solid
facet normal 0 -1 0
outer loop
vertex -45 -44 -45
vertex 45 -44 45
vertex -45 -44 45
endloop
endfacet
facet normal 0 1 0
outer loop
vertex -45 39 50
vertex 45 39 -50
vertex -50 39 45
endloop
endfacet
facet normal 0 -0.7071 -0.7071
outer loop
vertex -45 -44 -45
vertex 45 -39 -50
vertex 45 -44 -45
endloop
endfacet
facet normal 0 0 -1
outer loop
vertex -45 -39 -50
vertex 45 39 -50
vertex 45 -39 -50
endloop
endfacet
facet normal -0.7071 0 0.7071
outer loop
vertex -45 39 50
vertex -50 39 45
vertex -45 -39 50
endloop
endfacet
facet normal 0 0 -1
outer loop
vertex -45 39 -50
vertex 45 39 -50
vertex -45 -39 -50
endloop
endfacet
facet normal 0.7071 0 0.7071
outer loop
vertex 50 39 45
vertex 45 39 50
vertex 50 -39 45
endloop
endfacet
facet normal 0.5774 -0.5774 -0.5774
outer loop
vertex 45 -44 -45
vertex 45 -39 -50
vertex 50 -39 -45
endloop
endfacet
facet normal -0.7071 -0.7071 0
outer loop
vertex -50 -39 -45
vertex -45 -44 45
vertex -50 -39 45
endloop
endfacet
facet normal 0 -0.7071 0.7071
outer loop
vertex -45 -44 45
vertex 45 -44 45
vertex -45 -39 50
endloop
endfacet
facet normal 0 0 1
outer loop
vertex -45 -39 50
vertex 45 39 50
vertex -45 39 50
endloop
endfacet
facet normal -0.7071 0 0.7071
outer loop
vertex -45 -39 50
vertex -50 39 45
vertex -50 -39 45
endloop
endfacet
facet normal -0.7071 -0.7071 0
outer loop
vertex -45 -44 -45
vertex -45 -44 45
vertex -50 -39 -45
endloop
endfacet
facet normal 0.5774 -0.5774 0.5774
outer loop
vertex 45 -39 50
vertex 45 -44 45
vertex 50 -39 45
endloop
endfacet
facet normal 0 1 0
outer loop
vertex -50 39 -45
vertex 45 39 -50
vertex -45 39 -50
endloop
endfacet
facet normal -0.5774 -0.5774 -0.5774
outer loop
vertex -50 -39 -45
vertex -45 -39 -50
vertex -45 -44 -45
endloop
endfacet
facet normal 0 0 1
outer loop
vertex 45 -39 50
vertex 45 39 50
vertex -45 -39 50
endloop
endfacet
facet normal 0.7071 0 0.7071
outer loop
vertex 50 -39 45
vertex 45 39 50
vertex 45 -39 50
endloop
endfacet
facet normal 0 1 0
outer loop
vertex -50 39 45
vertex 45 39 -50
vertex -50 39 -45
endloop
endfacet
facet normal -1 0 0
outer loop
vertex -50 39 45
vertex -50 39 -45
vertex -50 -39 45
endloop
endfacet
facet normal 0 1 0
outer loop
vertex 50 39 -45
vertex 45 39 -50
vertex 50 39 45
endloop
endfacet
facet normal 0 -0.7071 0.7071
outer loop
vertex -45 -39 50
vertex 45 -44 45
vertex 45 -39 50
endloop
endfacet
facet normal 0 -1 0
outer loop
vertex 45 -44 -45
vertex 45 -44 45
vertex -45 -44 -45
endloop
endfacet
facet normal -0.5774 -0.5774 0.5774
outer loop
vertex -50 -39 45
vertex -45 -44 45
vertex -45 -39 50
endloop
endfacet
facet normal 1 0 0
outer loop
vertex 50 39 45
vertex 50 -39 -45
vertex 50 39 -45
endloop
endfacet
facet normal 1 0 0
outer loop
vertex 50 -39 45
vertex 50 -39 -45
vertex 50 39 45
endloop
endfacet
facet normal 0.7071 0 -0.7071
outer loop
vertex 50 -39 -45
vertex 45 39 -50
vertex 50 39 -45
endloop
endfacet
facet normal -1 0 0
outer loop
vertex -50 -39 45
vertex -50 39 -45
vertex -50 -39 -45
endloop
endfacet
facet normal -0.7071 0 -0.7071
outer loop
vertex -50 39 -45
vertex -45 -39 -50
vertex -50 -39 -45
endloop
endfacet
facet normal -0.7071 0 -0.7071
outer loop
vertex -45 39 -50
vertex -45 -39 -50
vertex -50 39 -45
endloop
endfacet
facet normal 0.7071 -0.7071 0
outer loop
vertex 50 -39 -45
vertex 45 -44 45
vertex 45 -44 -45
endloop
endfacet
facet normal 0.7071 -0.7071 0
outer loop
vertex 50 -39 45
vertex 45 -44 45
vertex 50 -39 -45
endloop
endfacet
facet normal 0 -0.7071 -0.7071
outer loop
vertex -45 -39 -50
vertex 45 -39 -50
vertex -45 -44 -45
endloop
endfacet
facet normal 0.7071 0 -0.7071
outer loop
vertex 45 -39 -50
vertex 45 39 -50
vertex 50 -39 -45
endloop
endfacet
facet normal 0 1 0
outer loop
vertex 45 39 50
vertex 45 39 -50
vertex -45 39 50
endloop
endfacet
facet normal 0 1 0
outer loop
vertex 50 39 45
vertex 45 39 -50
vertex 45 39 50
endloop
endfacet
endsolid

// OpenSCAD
module hmd()
{
	$fn = 20;
	difference()
	{
		translate ([0,50,0]) hull()
		{
			cube([200,90,90], center = true);
			cube([190,100,90], center = true);
			cube([190,90,100], center = true); 
		}
		
		translate ([33,0,0]) rotate([90,0,0]) cylinder(r=33, h=42, center = true);
		translate ([-33,0,0])rotate([90,0,0]) cylinder(r=33, h=42, center = true);
		translate ([0,0,33/2]) cube([66,42,33], center = true);
	}
	
	translate ([0,-65,-10]) difference()
	{
		union()
		{
			cylinder(r=125, h=28);
			rotate([0,90,0]) cylinder(r=122, h=36, center = true);
		}
		 
		rotate([0,180,0]) cylinder(r=125, h=250);
		sphere (r=115, $fn = 12);
	}
}

module tracker()
{
	$fn = 18;
	
	hull()
	{
		cylinder(r=38, r2=45, h = 12);
		translate([0,0,12]) cylinder(r=45, r2=45, h = 3);
		translate([0,0,15]) cylinder(r=45, r2=42, h = 3); 
	}
	
	for(i=[0:3]) rotate([0,0,i*120])
	{
		$fn = 8;
		translate([30.5,0,7]) scale([1,2,1]) rotate ([0,36,0]) cylinder(r=10, r2=8, h = 30);
	}
}

module controller()
{
	$fn = 18;
	
	difference()
	{
		union()
		{ 
			cylinder(r=50, h = 5, center = true);
			translate([0,0,+2.5]) cylinder(r=50, r2=40, h = 10.5);
			translate([0,0,-13.0]) cylinder(r=40, r2=50, h = 10.5);
			
			hull()
			{				
				$fn = 10;
				translate([0,-35,0]) scale([1.3,.75,1]) cylinder(r=20, h = 5, center = true);
				translate([0,-85,-120]) scale([1.1,.9,.65]) sphere(r=12.5);
			}
			
			for(i=[0:2]) rotate([0,0,i*180])
			{
				$fn = 8;
				translate([41,0,-5]) scale([1,2,1]) rotate ([0,140,0]) cylinder(r=9, r2=6, h = 17);
			}
		}
		
		translate([0,0,+2.5]) cylinder(r=25, r2=35, h = 11);  
		cylinder(r=25, h = 60, center = true);
	}
	 
	translate([0,-56,-40]) rotate([70,0,0]) cylinder(r=17, h = 20, center = true);
}

module lighthouse()
{
	translate ([0,0,0]) hull()
	{
		cube([100,78,90], center = true);
		translate ([0,-2.5,0]) cube([90,83,90], center = true);
		cube([90,78,100], center = true); 
	}
}

lighthouse();
